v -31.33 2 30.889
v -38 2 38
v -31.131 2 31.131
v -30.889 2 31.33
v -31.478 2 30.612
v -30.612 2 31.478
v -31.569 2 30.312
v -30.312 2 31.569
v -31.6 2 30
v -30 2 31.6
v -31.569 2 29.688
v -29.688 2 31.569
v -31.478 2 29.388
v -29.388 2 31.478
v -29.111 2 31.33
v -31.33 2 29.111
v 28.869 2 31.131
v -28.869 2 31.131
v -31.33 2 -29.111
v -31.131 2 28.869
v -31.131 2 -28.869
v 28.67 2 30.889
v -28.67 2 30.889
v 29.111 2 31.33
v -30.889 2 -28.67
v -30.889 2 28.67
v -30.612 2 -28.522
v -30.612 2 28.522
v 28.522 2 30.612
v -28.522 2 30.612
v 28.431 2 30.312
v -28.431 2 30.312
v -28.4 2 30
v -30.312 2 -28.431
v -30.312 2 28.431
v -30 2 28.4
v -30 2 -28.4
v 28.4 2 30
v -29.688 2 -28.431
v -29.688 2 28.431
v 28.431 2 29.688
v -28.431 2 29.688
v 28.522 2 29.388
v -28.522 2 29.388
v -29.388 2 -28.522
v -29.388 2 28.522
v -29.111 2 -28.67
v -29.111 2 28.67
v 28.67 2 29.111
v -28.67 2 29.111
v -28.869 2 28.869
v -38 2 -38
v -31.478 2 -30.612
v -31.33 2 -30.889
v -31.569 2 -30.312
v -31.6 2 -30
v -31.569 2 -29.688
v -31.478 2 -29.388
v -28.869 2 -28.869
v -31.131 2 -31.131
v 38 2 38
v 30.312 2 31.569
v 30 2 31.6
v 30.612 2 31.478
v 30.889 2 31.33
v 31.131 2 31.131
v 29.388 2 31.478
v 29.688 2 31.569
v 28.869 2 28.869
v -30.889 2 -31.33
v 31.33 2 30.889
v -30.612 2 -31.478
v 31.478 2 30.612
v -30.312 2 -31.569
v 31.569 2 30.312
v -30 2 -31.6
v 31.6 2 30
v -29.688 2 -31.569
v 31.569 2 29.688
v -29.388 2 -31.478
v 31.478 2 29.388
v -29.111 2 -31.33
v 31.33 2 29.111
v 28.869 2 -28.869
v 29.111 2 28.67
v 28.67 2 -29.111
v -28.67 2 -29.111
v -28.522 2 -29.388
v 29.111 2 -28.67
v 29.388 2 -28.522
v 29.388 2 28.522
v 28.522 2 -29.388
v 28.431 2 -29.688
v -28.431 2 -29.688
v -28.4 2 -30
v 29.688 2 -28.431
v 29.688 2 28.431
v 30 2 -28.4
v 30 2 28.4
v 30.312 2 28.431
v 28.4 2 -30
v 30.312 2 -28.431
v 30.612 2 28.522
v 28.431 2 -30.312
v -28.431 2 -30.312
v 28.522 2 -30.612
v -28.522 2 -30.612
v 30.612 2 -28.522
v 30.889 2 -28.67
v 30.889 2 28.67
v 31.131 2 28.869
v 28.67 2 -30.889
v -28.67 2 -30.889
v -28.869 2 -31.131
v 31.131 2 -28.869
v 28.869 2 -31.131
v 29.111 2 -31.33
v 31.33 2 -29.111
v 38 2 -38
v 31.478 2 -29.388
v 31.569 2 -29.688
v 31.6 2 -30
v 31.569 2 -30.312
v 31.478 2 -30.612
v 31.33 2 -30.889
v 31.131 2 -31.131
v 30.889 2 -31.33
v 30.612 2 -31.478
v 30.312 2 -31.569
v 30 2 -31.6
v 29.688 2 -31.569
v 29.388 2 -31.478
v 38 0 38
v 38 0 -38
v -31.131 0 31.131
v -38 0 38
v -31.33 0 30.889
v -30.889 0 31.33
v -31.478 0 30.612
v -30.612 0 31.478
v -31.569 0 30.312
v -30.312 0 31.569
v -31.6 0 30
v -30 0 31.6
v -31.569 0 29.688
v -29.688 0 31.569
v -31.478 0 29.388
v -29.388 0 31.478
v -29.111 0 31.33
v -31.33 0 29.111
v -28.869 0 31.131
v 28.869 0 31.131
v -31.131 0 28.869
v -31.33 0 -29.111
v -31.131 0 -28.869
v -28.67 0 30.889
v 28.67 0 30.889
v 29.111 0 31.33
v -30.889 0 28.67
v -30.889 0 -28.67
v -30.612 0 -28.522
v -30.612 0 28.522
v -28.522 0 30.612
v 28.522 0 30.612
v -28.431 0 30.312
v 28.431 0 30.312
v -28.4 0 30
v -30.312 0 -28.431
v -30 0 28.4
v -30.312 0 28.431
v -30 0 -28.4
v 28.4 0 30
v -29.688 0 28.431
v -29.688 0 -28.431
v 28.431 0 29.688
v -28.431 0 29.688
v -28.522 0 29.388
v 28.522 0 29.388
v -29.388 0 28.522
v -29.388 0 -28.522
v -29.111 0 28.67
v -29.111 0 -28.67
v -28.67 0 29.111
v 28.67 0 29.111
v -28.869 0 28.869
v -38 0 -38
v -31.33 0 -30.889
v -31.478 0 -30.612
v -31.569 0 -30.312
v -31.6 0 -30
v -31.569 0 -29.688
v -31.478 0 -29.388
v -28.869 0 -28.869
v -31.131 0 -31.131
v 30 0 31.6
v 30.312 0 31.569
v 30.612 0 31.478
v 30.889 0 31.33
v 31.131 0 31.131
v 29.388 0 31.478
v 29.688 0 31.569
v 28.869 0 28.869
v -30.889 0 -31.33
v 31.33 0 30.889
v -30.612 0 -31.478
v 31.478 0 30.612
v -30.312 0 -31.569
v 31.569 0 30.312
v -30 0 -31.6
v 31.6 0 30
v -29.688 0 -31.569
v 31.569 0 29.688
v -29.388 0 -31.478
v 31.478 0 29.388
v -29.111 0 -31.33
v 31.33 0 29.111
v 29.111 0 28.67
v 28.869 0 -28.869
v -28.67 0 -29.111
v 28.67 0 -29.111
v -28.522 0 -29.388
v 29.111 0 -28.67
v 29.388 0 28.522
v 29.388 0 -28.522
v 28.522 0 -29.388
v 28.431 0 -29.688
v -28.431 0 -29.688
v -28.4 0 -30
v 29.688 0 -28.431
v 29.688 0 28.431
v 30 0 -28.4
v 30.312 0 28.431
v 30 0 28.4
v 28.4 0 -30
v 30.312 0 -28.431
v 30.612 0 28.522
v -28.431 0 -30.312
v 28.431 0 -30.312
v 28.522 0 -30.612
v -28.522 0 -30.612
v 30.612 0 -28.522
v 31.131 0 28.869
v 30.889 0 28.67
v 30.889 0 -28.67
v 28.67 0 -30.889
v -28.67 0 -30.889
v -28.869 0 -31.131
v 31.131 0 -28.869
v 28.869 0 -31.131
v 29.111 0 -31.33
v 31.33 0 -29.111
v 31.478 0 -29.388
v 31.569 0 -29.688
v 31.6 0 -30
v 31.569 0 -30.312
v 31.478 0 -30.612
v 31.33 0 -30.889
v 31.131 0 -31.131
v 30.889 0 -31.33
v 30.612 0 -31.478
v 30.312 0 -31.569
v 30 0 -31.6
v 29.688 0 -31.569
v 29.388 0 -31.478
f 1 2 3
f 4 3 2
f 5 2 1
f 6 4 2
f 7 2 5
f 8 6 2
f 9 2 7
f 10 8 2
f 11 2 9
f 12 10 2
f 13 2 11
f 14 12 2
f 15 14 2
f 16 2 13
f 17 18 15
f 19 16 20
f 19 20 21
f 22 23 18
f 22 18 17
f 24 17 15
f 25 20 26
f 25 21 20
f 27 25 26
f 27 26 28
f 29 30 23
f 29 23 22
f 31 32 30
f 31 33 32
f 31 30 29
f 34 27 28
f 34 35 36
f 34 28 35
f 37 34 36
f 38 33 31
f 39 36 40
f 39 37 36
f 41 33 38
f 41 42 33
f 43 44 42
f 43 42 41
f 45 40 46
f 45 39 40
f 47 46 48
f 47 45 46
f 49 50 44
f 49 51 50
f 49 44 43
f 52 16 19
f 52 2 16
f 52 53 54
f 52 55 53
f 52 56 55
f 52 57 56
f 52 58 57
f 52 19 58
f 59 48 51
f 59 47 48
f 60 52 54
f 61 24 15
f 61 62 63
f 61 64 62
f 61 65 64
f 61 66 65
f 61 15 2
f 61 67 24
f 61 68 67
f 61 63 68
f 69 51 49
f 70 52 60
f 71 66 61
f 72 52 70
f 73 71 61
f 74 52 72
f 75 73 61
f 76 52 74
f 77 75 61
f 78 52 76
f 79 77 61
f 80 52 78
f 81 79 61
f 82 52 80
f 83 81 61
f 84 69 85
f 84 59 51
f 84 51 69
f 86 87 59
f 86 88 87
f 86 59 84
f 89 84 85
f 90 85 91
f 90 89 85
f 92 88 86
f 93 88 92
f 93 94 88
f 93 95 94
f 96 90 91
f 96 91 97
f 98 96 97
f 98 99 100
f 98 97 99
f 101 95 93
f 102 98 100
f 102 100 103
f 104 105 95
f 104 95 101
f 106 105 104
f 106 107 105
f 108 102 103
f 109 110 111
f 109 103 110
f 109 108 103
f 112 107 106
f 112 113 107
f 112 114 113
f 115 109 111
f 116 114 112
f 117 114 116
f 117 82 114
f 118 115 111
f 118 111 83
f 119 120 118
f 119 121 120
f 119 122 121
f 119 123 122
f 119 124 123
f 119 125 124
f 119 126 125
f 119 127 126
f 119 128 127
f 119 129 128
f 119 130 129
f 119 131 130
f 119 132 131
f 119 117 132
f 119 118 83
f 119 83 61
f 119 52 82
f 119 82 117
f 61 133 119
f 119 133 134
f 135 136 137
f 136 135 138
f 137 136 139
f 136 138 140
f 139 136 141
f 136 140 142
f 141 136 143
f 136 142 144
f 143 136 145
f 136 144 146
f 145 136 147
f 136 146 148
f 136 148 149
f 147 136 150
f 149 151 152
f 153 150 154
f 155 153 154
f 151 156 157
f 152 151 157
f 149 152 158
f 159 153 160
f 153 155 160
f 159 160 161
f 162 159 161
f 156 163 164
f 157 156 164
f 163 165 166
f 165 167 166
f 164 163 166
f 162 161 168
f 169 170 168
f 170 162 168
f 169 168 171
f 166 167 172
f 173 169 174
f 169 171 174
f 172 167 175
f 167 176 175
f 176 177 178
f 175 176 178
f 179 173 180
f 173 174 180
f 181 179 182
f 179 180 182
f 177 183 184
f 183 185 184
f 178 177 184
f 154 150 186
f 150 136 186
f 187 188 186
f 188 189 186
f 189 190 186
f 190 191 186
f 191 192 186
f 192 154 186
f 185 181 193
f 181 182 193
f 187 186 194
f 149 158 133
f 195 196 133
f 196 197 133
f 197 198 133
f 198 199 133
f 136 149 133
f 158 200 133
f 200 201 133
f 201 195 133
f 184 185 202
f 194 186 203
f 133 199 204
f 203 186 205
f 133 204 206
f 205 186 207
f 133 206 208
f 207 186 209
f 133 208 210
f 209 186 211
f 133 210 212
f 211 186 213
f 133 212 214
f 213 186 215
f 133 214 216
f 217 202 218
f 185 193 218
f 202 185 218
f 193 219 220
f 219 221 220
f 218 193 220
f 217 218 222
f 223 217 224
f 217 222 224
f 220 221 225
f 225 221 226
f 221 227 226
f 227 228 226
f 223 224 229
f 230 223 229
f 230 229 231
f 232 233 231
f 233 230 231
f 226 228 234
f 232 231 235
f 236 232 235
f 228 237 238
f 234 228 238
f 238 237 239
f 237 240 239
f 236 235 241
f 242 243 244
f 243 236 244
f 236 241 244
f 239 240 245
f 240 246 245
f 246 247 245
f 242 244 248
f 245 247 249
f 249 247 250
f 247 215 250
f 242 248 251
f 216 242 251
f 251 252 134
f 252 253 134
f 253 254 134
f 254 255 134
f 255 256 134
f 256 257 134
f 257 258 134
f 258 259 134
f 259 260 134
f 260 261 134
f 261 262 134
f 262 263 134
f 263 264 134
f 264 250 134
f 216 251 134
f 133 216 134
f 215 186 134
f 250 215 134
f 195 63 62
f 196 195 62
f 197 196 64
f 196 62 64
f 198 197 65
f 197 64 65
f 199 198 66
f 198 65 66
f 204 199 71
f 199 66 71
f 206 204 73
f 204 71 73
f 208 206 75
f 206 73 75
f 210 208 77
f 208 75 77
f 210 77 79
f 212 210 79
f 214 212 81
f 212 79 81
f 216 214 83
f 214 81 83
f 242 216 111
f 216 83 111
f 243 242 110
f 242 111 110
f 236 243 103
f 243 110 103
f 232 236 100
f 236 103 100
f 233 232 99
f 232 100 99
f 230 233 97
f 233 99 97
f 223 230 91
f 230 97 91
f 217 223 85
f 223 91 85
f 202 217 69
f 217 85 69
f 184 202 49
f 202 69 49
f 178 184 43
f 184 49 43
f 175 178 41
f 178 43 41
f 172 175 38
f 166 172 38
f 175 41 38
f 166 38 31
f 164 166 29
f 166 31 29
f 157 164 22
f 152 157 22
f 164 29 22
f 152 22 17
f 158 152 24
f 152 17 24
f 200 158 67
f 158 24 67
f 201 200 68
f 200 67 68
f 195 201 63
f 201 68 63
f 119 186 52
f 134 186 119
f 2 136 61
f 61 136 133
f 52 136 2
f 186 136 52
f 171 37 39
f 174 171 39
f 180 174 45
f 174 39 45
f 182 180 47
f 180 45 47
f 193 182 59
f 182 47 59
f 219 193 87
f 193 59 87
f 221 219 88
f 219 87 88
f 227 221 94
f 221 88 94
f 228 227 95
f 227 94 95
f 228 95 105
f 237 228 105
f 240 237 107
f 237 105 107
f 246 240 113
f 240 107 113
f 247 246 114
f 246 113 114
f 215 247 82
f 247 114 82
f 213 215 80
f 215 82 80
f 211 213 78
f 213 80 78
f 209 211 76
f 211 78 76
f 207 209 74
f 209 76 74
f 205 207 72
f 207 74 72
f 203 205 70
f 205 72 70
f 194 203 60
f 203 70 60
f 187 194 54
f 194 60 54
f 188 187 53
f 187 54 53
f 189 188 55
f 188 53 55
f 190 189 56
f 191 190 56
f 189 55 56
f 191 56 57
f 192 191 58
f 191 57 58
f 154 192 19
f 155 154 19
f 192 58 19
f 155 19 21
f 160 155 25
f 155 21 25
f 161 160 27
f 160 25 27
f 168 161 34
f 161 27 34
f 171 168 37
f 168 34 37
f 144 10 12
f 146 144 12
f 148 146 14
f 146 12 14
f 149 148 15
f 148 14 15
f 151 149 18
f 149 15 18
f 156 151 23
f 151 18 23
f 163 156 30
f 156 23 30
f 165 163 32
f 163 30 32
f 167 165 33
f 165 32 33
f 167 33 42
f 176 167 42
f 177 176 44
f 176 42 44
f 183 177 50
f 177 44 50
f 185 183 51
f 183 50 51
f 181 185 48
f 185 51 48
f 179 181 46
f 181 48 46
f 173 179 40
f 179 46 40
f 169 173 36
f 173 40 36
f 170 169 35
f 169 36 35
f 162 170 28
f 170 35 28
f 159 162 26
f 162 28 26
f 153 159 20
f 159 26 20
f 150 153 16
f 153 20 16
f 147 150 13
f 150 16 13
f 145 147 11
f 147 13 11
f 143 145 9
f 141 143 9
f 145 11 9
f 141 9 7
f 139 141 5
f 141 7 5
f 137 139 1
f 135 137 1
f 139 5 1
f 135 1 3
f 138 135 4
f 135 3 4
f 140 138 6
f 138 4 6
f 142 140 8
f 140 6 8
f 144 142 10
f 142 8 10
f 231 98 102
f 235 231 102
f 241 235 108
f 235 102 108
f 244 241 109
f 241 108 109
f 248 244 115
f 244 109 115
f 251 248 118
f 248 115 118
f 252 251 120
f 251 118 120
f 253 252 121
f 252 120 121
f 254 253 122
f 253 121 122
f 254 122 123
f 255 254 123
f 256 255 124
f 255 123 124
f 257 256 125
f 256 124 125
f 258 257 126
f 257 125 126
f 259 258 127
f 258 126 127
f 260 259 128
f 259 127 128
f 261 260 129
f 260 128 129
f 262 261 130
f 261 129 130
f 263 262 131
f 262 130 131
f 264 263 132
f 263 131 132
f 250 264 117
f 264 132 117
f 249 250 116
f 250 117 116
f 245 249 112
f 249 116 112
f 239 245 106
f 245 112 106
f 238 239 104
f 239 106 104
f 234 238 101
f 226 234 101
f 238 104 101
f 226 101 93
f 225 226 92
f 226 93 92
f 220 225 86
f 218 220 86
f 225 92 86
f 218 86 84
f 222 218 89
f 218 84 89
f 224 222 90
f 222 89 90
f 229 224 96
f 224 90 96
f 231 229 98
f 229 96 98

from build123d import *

# Parameters (mm, degrees)
SKETCH_1_W                  = 76
SKETCH_1_H                  = 76
EXTRUDE_1_DEPTH             = 2
SKETCH_2_R                  = 1.6
CUT_EXTRUDE_1_DEPTH         = 2
PATTERN_LINEAR_1_COUNT      = 2
PATTERN_LINEAR_1_PITCH      = 60
PATTERN_LINEAR_1_COUNT_DIR2 = 2
PATTERN_LINEAR_1_PITCH_DIR2 = 60


with BuildPart() as part:
    # 草图1 → 凸台-拉伸1 (new body)
    with BuildSketch(Plane(origin=(0, 0, 0), x_dir=(1, 0, 0), z_dir=(0, 1, 0))):
        Rectangle(SKETCH_1_W, SKETCH_1_H)
    extrude(amount=EXTRUDE_1_DEPTH)

    # 草图2 → 切除-拉伸1 (cut)
    with BuildSketch(Plane(origin=(0, 2, 0), x_dir=(1, 0, 0), z_dir=(0, 1, 0))):
        with Locations(Location((-30, 30, 0), (0, 0, 270))):
            Circle(SKETCH_2_R)
    cut_extrude_1 = extrude(amount=-CUT_EXTRUDE_1_DEPTH, mode=Mode.SUBTRACT)

    # 阵列(线性)1: Cut-Extrude 1 2 × 2
    with Locations(*[(i * PATTERN_LINEAR_1_PITCH, 0, j * PATTERN_LINEAR_1_PITCH_DIR2) for i in range(PATTERN_LINEAR_1_COUNT) for j in range(PATTERN_LINEAR_1_COUNT_DIR2) if (i, j) != (0, 0)]):
        add(cut_extrude_1, mode=Mode.SUBTRACT)


solid = part.part
